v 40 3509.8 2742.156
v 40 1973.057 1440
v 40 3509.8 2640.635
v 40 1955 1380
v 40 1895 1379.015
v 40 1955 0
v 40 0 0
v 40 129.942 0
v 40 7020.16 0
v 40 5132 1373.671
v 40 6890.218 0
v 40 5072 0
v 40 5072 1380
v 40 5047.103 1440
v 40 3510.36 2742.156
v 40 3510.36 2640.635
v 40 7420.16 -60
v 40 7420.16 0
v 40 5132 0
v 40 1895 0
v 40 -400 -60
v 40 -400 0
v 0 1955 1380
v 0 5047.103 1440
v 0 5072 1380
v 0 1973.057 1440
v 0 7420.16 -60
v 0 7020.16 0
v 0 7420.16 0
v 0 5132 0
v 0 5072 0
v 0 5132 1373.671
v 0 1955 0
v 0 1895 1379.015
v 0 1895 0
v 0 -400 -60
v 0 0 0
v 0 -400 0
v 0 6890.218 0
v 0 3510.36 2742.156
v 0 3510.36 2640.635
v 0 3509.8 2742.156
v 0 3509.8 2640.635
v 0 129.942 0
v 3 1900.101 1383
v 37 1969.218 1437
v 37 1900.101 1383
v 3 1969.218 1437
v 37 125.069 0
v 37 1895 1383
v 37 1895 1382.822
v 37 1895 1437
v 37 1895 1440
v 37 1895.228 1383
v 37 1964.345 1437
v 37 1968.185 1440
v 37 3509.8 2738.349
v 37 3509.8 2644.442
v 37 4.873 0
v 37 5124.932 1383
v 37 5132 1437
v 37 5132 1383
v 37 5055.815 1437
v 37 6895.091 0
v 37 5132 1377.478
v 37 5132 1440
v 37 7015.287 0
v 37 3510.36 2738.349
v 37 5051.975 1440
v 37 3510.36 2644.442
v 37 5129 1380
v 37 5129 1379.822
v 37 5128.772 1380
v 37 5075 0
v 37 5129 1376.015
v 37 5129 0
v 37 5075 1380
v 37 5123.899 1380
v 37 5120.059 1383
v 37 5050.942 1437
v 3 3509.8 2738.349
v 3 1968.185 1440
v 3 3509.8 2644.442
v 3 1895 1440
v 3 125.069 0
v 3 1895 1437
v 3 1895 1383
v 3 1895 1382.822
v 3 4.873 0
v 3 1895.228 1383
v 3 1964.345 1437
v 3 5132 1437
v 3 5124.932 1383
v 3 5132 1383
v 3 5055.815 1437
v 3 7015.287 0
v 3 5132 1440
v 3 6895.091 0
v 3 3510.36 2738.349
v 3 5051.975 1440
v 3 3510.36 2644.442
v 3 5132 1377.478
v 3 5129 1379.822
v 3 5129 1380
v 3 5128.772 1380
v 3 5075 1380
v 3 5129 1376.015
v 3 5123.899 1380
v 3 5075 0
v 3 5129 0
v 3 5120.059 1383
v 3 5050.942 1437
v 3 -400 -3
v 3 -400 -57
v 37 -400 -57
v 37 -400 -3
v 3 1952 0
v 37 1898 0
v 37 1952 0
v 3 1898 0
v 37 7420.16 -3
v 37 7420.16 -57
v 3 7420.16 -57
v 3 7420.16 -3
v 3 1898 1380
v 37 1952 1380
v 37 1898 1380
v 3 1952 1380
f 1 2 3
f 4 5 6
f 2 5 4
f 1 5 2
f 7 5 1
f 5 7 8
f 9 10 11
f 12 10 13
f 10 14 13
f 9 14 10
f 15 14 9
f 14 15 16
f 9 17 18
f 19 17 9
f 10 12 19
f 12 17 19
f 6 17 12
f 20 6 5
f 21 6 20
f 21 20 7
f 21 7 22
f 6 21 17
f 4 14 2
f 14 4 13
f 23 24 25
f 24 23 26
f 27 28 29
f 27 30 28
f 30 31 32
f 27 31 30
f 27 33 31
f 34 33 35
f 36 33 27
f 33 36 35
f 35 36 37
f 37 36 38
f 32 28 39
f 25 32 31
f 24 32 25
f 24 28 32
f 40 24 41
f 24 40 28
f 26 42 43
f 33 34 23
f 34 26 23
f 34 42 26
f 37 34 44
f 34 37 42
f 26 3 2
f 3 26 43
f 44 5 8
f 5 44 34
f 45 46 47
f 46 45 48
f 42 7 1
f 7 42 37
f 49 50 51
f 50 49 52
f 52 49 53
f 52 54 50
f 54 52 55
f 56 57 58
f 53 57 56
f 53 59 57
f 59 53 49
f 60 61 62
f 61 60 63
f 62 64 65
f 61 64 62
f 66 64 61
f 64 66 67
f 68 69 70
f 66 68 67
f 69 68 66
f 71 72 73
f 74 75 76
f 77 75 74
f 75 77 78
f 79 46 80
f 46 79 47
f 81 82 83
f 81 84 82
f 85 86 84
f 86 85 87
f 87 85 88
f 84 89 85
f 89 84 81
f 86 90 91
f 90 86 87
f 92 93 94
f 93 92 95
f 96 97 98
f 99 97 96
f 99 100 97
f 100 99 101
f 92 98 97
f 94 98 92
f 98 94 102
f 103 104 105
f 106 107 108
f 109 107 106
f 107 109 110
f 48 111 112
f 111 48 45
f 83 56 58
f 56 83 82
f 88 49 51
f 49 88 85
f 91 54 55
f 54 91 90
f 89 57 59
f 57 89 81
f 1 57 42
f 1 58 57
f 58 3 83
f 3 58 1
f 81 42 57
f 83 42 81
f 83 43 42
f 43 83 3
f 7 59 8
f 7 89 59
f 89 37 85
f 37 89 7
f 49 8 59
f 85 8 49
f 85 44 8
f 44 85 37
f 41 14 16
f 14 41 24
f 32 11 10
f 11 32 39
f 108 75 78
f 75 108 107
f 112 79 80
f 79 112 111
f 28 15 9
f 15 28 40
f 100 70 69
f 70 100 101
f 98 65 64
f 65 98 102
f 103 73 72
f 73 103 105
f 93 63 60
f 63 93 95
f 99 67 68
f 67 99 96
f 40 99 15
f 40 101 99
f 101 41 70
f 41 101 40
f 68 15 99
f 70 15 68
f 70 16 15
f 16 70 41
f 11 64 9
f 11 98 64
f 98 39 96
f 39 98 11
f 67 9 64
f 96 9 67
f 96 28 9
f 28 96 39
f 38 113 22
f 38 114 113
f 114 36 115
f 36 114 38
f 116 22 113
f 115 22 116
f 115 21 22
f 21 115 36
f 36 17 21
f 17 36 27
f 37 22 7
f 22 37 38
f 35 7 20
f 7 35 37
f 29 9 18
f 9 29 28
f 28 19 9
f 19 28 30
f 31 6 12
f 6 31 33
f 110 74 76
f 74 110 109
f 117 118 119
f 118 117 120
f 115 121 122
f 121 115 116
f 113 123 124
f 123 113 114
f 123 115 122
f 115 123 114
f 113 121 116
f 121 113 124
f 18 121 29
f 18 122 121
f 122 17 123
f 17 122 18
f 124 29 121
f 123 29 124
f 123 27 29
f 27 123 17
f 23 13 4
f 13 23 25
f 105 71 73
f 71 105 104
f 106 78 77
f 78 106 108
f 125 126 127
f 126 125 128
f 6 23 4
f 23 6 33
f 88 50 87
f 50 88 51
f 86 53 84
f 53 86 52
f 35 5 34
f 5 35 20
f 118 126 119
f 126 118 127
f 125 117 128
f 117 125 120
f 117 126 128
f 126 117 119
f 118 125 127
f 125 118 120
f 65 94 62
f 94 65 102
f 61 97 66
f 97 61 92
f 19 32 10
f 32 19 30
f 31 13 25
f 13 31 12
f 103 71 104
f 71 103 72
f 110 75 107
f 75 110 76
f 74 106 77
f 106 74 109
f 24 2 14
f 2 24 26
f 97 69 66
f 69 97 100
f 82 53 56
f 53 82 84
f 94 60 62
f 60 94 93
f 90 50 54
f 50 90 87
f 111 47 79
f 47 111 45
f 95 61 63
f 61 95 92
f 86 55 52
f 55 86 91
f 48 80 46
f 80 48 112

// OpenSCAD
// file: basic components/params_metal_profiles.scad
// F-Roof: A multi-function single-layer roof
// https://github.com/f-roof
// Author: Mihai Oltean; https://tcreate.org
//---------------------------------------------------------------------------------------
T_profile_thick = 4;
//---------------------------------------------------------------------------------------
// file: params_house.scad
// F-Roof: A multi-function single-layer roof
// https://github.com/f-roof
// Author: Mihai Oltean; https://tcreate.org
//---------------------------------------------------------------------------------------
base_length = 14000;
base_house_width = 6930;
house_height = 2000;

base_beam_side = 150; // this was already there on the top of the house
//---------------------------------------------------------------------------------------
// file: basic components/metal_profiles.scad
// F-Roof: A multi-function single-layer roof
// https://github.com/f-roof
// Author: Mihai Oltean; https://tcreate.org
//---------------------------------------------------------------------------------------
include <params_metal_profiles.scad>
//---------------------------------------------------------------------------------------
module rectangular_tube(length, H, W)
{
    color("gray") 
    difference(){
        cube([W, H, length]);
        translate ([3, 3, 0] - [0,0,1]) cube([W - 6, H - 6, length] + [0, 0, 2]);
    }
}
//---------------------------------------------------------------------------------------
module T_40_4(length)
{
    translate ([0, -20, 0]){
        difference(){
        // base wall
            cube([length, 40, T_profile_thick]);
            /*
            for (k = [0 : 6]){
                translate ([k * distance_between_capriori + caprior_side_small / 2, 10, 0]) cylinder(h = T_profile_thick + 2, r = 4);
                translate ([k * distance_between_capriori + caprior_side_small / 2, 30, 0]) cylinder(h = T_profile_thick + 2, r = 4);
            }
            */
        }
        // vertical wall
        translate ([0, 20 - T_profile_thick / 2, 0]) cube([length, T_profile_thick, 40]);
    }
}
//---------------------------------------------------------------------------------------

T_40_4(1000);
// file: params_truss.scad
// F-Roof: A multi-function single-layer roof
// https://github.com/f-roof
// Author: Mihai Oltean; https://tcreate.org
//---------------------------------------------------------------------------------------
include <params_house.scad>
//---------------------------------------------------------------------------------------
base_bar_half_span = 3380 + 130.08;

truss_top_chord_length = 4454;
truss_base_bar_side_long = 60;
truss_top_chord_side_long = 80;
truss_side_small_size = 40; // this is the same for base and chord

truss_external_offset = 400;
truss_base_bar_length = 2 * base_bar_half_span + 2 * truss_external_offset;
//---------------------------------------------------------------------------------------
// main file
// F-Roof: A multi-function single-layer roof
// https://github.com/f-roof
// Author: Mihai Oltean; https://tcreate.org
//------------------------------------------------------------------------------------
include <params_truss.scad>
use <basic components/metal_profiles.scad>
//-------------------------------------------------------------
module angle_beam(length, angle)
{
    difference(){
       // tube(length);
       rectangular_tube(length, truss_top_chord_side_long, truss_side_small_size);
            // taietura sus
        translate([0, 0, truss_top_chord_length] - [1, 0, 0]) 
            rotate([-(angle), 0, 0]) 
            cube([truss_side_small_size, 2 * truss_top_chord_side_long, 2 * truss_side_small_size] + [2, 0, 0]);
            // taietura jos la unghi
        translate( - [1, 0, 0]) 
            rotate([-(angle), 0, 0]) 
            cube([truss_side_small_size, 3 * truss_top_chord_side_long, 4 * truss_side_small_size] + [2, 0, 0]);
    }
}
//---------------------------------------------------------------------------------------
module truss_base_beam(length)
{
    rectangular_tube(length, truss_base_bar_side_long, truss_side_small_size);
    color("red"){
        rectangular_tube(truss_external_offset + 130, truss_base_bar_side_long, truss_side_small_size);
        translate([0, 0, length - (truss_external_offset + 130)])
            rectangular_tube(truss_external_offset + 130, truss_base_bar_side_long, truss_side_small_size);
        
    }
/*
    color("gray")
        difference(){
            cube([caprior_side_small, base_bar_side_long, length]);
            translate ([3, 3, 0] - [0,0,1]) cube([caprior_side_small - 6, base_bar_side_long - 6, length] + [0, 0, 2]);
        }
*/
}
//---------------------------------------------------------------------------------------
module truss(angle)
{
// one beam
     translate ([0, 0, 0]) 
        rotate([-(90-angle), 0, 0]) 
            angle_beam(truss_top_chord_length, angle);
    
// other beam            
    translate ([truss_side_small_size, truss_base_bar_length -2 * truss_external_offset, 0])   
        translate ([0, 0, 0]) 
            rotate([90 - angle, 0, 0]) 
                rotate([0, 0, 180]) 
                angle_beam(truss_top_chord_length, angle)
                ;
            
// base beam            
    translate([0, -truss_external_offset, 0])   
        rotate([-90, 0, 0]) 
            truss_base_beam(truss_base_bar_length)
            ;
            
// interior left 1 
    translate ([0, 1765 + 130, 0])
        rectangular_tube(1380, truss_base_bar_side_long, truss_side_small_size);
// interior right
    translate ([0, 4942 + 130, 0])
        rectangular_tube(1380, truss_base_bar_side_long, truss_side_small_size);
// interior top
        translate ([0, 1765 + 130, 1380 + truss_base_bar_side_long]) rotate([-90, 0, 0])  
        color("red")
        rectangular_tube(3237, truss_base_bar_side_long, truss_side_small_size);
}
//---------------------------------------------------------------------------------------
truss(38);
